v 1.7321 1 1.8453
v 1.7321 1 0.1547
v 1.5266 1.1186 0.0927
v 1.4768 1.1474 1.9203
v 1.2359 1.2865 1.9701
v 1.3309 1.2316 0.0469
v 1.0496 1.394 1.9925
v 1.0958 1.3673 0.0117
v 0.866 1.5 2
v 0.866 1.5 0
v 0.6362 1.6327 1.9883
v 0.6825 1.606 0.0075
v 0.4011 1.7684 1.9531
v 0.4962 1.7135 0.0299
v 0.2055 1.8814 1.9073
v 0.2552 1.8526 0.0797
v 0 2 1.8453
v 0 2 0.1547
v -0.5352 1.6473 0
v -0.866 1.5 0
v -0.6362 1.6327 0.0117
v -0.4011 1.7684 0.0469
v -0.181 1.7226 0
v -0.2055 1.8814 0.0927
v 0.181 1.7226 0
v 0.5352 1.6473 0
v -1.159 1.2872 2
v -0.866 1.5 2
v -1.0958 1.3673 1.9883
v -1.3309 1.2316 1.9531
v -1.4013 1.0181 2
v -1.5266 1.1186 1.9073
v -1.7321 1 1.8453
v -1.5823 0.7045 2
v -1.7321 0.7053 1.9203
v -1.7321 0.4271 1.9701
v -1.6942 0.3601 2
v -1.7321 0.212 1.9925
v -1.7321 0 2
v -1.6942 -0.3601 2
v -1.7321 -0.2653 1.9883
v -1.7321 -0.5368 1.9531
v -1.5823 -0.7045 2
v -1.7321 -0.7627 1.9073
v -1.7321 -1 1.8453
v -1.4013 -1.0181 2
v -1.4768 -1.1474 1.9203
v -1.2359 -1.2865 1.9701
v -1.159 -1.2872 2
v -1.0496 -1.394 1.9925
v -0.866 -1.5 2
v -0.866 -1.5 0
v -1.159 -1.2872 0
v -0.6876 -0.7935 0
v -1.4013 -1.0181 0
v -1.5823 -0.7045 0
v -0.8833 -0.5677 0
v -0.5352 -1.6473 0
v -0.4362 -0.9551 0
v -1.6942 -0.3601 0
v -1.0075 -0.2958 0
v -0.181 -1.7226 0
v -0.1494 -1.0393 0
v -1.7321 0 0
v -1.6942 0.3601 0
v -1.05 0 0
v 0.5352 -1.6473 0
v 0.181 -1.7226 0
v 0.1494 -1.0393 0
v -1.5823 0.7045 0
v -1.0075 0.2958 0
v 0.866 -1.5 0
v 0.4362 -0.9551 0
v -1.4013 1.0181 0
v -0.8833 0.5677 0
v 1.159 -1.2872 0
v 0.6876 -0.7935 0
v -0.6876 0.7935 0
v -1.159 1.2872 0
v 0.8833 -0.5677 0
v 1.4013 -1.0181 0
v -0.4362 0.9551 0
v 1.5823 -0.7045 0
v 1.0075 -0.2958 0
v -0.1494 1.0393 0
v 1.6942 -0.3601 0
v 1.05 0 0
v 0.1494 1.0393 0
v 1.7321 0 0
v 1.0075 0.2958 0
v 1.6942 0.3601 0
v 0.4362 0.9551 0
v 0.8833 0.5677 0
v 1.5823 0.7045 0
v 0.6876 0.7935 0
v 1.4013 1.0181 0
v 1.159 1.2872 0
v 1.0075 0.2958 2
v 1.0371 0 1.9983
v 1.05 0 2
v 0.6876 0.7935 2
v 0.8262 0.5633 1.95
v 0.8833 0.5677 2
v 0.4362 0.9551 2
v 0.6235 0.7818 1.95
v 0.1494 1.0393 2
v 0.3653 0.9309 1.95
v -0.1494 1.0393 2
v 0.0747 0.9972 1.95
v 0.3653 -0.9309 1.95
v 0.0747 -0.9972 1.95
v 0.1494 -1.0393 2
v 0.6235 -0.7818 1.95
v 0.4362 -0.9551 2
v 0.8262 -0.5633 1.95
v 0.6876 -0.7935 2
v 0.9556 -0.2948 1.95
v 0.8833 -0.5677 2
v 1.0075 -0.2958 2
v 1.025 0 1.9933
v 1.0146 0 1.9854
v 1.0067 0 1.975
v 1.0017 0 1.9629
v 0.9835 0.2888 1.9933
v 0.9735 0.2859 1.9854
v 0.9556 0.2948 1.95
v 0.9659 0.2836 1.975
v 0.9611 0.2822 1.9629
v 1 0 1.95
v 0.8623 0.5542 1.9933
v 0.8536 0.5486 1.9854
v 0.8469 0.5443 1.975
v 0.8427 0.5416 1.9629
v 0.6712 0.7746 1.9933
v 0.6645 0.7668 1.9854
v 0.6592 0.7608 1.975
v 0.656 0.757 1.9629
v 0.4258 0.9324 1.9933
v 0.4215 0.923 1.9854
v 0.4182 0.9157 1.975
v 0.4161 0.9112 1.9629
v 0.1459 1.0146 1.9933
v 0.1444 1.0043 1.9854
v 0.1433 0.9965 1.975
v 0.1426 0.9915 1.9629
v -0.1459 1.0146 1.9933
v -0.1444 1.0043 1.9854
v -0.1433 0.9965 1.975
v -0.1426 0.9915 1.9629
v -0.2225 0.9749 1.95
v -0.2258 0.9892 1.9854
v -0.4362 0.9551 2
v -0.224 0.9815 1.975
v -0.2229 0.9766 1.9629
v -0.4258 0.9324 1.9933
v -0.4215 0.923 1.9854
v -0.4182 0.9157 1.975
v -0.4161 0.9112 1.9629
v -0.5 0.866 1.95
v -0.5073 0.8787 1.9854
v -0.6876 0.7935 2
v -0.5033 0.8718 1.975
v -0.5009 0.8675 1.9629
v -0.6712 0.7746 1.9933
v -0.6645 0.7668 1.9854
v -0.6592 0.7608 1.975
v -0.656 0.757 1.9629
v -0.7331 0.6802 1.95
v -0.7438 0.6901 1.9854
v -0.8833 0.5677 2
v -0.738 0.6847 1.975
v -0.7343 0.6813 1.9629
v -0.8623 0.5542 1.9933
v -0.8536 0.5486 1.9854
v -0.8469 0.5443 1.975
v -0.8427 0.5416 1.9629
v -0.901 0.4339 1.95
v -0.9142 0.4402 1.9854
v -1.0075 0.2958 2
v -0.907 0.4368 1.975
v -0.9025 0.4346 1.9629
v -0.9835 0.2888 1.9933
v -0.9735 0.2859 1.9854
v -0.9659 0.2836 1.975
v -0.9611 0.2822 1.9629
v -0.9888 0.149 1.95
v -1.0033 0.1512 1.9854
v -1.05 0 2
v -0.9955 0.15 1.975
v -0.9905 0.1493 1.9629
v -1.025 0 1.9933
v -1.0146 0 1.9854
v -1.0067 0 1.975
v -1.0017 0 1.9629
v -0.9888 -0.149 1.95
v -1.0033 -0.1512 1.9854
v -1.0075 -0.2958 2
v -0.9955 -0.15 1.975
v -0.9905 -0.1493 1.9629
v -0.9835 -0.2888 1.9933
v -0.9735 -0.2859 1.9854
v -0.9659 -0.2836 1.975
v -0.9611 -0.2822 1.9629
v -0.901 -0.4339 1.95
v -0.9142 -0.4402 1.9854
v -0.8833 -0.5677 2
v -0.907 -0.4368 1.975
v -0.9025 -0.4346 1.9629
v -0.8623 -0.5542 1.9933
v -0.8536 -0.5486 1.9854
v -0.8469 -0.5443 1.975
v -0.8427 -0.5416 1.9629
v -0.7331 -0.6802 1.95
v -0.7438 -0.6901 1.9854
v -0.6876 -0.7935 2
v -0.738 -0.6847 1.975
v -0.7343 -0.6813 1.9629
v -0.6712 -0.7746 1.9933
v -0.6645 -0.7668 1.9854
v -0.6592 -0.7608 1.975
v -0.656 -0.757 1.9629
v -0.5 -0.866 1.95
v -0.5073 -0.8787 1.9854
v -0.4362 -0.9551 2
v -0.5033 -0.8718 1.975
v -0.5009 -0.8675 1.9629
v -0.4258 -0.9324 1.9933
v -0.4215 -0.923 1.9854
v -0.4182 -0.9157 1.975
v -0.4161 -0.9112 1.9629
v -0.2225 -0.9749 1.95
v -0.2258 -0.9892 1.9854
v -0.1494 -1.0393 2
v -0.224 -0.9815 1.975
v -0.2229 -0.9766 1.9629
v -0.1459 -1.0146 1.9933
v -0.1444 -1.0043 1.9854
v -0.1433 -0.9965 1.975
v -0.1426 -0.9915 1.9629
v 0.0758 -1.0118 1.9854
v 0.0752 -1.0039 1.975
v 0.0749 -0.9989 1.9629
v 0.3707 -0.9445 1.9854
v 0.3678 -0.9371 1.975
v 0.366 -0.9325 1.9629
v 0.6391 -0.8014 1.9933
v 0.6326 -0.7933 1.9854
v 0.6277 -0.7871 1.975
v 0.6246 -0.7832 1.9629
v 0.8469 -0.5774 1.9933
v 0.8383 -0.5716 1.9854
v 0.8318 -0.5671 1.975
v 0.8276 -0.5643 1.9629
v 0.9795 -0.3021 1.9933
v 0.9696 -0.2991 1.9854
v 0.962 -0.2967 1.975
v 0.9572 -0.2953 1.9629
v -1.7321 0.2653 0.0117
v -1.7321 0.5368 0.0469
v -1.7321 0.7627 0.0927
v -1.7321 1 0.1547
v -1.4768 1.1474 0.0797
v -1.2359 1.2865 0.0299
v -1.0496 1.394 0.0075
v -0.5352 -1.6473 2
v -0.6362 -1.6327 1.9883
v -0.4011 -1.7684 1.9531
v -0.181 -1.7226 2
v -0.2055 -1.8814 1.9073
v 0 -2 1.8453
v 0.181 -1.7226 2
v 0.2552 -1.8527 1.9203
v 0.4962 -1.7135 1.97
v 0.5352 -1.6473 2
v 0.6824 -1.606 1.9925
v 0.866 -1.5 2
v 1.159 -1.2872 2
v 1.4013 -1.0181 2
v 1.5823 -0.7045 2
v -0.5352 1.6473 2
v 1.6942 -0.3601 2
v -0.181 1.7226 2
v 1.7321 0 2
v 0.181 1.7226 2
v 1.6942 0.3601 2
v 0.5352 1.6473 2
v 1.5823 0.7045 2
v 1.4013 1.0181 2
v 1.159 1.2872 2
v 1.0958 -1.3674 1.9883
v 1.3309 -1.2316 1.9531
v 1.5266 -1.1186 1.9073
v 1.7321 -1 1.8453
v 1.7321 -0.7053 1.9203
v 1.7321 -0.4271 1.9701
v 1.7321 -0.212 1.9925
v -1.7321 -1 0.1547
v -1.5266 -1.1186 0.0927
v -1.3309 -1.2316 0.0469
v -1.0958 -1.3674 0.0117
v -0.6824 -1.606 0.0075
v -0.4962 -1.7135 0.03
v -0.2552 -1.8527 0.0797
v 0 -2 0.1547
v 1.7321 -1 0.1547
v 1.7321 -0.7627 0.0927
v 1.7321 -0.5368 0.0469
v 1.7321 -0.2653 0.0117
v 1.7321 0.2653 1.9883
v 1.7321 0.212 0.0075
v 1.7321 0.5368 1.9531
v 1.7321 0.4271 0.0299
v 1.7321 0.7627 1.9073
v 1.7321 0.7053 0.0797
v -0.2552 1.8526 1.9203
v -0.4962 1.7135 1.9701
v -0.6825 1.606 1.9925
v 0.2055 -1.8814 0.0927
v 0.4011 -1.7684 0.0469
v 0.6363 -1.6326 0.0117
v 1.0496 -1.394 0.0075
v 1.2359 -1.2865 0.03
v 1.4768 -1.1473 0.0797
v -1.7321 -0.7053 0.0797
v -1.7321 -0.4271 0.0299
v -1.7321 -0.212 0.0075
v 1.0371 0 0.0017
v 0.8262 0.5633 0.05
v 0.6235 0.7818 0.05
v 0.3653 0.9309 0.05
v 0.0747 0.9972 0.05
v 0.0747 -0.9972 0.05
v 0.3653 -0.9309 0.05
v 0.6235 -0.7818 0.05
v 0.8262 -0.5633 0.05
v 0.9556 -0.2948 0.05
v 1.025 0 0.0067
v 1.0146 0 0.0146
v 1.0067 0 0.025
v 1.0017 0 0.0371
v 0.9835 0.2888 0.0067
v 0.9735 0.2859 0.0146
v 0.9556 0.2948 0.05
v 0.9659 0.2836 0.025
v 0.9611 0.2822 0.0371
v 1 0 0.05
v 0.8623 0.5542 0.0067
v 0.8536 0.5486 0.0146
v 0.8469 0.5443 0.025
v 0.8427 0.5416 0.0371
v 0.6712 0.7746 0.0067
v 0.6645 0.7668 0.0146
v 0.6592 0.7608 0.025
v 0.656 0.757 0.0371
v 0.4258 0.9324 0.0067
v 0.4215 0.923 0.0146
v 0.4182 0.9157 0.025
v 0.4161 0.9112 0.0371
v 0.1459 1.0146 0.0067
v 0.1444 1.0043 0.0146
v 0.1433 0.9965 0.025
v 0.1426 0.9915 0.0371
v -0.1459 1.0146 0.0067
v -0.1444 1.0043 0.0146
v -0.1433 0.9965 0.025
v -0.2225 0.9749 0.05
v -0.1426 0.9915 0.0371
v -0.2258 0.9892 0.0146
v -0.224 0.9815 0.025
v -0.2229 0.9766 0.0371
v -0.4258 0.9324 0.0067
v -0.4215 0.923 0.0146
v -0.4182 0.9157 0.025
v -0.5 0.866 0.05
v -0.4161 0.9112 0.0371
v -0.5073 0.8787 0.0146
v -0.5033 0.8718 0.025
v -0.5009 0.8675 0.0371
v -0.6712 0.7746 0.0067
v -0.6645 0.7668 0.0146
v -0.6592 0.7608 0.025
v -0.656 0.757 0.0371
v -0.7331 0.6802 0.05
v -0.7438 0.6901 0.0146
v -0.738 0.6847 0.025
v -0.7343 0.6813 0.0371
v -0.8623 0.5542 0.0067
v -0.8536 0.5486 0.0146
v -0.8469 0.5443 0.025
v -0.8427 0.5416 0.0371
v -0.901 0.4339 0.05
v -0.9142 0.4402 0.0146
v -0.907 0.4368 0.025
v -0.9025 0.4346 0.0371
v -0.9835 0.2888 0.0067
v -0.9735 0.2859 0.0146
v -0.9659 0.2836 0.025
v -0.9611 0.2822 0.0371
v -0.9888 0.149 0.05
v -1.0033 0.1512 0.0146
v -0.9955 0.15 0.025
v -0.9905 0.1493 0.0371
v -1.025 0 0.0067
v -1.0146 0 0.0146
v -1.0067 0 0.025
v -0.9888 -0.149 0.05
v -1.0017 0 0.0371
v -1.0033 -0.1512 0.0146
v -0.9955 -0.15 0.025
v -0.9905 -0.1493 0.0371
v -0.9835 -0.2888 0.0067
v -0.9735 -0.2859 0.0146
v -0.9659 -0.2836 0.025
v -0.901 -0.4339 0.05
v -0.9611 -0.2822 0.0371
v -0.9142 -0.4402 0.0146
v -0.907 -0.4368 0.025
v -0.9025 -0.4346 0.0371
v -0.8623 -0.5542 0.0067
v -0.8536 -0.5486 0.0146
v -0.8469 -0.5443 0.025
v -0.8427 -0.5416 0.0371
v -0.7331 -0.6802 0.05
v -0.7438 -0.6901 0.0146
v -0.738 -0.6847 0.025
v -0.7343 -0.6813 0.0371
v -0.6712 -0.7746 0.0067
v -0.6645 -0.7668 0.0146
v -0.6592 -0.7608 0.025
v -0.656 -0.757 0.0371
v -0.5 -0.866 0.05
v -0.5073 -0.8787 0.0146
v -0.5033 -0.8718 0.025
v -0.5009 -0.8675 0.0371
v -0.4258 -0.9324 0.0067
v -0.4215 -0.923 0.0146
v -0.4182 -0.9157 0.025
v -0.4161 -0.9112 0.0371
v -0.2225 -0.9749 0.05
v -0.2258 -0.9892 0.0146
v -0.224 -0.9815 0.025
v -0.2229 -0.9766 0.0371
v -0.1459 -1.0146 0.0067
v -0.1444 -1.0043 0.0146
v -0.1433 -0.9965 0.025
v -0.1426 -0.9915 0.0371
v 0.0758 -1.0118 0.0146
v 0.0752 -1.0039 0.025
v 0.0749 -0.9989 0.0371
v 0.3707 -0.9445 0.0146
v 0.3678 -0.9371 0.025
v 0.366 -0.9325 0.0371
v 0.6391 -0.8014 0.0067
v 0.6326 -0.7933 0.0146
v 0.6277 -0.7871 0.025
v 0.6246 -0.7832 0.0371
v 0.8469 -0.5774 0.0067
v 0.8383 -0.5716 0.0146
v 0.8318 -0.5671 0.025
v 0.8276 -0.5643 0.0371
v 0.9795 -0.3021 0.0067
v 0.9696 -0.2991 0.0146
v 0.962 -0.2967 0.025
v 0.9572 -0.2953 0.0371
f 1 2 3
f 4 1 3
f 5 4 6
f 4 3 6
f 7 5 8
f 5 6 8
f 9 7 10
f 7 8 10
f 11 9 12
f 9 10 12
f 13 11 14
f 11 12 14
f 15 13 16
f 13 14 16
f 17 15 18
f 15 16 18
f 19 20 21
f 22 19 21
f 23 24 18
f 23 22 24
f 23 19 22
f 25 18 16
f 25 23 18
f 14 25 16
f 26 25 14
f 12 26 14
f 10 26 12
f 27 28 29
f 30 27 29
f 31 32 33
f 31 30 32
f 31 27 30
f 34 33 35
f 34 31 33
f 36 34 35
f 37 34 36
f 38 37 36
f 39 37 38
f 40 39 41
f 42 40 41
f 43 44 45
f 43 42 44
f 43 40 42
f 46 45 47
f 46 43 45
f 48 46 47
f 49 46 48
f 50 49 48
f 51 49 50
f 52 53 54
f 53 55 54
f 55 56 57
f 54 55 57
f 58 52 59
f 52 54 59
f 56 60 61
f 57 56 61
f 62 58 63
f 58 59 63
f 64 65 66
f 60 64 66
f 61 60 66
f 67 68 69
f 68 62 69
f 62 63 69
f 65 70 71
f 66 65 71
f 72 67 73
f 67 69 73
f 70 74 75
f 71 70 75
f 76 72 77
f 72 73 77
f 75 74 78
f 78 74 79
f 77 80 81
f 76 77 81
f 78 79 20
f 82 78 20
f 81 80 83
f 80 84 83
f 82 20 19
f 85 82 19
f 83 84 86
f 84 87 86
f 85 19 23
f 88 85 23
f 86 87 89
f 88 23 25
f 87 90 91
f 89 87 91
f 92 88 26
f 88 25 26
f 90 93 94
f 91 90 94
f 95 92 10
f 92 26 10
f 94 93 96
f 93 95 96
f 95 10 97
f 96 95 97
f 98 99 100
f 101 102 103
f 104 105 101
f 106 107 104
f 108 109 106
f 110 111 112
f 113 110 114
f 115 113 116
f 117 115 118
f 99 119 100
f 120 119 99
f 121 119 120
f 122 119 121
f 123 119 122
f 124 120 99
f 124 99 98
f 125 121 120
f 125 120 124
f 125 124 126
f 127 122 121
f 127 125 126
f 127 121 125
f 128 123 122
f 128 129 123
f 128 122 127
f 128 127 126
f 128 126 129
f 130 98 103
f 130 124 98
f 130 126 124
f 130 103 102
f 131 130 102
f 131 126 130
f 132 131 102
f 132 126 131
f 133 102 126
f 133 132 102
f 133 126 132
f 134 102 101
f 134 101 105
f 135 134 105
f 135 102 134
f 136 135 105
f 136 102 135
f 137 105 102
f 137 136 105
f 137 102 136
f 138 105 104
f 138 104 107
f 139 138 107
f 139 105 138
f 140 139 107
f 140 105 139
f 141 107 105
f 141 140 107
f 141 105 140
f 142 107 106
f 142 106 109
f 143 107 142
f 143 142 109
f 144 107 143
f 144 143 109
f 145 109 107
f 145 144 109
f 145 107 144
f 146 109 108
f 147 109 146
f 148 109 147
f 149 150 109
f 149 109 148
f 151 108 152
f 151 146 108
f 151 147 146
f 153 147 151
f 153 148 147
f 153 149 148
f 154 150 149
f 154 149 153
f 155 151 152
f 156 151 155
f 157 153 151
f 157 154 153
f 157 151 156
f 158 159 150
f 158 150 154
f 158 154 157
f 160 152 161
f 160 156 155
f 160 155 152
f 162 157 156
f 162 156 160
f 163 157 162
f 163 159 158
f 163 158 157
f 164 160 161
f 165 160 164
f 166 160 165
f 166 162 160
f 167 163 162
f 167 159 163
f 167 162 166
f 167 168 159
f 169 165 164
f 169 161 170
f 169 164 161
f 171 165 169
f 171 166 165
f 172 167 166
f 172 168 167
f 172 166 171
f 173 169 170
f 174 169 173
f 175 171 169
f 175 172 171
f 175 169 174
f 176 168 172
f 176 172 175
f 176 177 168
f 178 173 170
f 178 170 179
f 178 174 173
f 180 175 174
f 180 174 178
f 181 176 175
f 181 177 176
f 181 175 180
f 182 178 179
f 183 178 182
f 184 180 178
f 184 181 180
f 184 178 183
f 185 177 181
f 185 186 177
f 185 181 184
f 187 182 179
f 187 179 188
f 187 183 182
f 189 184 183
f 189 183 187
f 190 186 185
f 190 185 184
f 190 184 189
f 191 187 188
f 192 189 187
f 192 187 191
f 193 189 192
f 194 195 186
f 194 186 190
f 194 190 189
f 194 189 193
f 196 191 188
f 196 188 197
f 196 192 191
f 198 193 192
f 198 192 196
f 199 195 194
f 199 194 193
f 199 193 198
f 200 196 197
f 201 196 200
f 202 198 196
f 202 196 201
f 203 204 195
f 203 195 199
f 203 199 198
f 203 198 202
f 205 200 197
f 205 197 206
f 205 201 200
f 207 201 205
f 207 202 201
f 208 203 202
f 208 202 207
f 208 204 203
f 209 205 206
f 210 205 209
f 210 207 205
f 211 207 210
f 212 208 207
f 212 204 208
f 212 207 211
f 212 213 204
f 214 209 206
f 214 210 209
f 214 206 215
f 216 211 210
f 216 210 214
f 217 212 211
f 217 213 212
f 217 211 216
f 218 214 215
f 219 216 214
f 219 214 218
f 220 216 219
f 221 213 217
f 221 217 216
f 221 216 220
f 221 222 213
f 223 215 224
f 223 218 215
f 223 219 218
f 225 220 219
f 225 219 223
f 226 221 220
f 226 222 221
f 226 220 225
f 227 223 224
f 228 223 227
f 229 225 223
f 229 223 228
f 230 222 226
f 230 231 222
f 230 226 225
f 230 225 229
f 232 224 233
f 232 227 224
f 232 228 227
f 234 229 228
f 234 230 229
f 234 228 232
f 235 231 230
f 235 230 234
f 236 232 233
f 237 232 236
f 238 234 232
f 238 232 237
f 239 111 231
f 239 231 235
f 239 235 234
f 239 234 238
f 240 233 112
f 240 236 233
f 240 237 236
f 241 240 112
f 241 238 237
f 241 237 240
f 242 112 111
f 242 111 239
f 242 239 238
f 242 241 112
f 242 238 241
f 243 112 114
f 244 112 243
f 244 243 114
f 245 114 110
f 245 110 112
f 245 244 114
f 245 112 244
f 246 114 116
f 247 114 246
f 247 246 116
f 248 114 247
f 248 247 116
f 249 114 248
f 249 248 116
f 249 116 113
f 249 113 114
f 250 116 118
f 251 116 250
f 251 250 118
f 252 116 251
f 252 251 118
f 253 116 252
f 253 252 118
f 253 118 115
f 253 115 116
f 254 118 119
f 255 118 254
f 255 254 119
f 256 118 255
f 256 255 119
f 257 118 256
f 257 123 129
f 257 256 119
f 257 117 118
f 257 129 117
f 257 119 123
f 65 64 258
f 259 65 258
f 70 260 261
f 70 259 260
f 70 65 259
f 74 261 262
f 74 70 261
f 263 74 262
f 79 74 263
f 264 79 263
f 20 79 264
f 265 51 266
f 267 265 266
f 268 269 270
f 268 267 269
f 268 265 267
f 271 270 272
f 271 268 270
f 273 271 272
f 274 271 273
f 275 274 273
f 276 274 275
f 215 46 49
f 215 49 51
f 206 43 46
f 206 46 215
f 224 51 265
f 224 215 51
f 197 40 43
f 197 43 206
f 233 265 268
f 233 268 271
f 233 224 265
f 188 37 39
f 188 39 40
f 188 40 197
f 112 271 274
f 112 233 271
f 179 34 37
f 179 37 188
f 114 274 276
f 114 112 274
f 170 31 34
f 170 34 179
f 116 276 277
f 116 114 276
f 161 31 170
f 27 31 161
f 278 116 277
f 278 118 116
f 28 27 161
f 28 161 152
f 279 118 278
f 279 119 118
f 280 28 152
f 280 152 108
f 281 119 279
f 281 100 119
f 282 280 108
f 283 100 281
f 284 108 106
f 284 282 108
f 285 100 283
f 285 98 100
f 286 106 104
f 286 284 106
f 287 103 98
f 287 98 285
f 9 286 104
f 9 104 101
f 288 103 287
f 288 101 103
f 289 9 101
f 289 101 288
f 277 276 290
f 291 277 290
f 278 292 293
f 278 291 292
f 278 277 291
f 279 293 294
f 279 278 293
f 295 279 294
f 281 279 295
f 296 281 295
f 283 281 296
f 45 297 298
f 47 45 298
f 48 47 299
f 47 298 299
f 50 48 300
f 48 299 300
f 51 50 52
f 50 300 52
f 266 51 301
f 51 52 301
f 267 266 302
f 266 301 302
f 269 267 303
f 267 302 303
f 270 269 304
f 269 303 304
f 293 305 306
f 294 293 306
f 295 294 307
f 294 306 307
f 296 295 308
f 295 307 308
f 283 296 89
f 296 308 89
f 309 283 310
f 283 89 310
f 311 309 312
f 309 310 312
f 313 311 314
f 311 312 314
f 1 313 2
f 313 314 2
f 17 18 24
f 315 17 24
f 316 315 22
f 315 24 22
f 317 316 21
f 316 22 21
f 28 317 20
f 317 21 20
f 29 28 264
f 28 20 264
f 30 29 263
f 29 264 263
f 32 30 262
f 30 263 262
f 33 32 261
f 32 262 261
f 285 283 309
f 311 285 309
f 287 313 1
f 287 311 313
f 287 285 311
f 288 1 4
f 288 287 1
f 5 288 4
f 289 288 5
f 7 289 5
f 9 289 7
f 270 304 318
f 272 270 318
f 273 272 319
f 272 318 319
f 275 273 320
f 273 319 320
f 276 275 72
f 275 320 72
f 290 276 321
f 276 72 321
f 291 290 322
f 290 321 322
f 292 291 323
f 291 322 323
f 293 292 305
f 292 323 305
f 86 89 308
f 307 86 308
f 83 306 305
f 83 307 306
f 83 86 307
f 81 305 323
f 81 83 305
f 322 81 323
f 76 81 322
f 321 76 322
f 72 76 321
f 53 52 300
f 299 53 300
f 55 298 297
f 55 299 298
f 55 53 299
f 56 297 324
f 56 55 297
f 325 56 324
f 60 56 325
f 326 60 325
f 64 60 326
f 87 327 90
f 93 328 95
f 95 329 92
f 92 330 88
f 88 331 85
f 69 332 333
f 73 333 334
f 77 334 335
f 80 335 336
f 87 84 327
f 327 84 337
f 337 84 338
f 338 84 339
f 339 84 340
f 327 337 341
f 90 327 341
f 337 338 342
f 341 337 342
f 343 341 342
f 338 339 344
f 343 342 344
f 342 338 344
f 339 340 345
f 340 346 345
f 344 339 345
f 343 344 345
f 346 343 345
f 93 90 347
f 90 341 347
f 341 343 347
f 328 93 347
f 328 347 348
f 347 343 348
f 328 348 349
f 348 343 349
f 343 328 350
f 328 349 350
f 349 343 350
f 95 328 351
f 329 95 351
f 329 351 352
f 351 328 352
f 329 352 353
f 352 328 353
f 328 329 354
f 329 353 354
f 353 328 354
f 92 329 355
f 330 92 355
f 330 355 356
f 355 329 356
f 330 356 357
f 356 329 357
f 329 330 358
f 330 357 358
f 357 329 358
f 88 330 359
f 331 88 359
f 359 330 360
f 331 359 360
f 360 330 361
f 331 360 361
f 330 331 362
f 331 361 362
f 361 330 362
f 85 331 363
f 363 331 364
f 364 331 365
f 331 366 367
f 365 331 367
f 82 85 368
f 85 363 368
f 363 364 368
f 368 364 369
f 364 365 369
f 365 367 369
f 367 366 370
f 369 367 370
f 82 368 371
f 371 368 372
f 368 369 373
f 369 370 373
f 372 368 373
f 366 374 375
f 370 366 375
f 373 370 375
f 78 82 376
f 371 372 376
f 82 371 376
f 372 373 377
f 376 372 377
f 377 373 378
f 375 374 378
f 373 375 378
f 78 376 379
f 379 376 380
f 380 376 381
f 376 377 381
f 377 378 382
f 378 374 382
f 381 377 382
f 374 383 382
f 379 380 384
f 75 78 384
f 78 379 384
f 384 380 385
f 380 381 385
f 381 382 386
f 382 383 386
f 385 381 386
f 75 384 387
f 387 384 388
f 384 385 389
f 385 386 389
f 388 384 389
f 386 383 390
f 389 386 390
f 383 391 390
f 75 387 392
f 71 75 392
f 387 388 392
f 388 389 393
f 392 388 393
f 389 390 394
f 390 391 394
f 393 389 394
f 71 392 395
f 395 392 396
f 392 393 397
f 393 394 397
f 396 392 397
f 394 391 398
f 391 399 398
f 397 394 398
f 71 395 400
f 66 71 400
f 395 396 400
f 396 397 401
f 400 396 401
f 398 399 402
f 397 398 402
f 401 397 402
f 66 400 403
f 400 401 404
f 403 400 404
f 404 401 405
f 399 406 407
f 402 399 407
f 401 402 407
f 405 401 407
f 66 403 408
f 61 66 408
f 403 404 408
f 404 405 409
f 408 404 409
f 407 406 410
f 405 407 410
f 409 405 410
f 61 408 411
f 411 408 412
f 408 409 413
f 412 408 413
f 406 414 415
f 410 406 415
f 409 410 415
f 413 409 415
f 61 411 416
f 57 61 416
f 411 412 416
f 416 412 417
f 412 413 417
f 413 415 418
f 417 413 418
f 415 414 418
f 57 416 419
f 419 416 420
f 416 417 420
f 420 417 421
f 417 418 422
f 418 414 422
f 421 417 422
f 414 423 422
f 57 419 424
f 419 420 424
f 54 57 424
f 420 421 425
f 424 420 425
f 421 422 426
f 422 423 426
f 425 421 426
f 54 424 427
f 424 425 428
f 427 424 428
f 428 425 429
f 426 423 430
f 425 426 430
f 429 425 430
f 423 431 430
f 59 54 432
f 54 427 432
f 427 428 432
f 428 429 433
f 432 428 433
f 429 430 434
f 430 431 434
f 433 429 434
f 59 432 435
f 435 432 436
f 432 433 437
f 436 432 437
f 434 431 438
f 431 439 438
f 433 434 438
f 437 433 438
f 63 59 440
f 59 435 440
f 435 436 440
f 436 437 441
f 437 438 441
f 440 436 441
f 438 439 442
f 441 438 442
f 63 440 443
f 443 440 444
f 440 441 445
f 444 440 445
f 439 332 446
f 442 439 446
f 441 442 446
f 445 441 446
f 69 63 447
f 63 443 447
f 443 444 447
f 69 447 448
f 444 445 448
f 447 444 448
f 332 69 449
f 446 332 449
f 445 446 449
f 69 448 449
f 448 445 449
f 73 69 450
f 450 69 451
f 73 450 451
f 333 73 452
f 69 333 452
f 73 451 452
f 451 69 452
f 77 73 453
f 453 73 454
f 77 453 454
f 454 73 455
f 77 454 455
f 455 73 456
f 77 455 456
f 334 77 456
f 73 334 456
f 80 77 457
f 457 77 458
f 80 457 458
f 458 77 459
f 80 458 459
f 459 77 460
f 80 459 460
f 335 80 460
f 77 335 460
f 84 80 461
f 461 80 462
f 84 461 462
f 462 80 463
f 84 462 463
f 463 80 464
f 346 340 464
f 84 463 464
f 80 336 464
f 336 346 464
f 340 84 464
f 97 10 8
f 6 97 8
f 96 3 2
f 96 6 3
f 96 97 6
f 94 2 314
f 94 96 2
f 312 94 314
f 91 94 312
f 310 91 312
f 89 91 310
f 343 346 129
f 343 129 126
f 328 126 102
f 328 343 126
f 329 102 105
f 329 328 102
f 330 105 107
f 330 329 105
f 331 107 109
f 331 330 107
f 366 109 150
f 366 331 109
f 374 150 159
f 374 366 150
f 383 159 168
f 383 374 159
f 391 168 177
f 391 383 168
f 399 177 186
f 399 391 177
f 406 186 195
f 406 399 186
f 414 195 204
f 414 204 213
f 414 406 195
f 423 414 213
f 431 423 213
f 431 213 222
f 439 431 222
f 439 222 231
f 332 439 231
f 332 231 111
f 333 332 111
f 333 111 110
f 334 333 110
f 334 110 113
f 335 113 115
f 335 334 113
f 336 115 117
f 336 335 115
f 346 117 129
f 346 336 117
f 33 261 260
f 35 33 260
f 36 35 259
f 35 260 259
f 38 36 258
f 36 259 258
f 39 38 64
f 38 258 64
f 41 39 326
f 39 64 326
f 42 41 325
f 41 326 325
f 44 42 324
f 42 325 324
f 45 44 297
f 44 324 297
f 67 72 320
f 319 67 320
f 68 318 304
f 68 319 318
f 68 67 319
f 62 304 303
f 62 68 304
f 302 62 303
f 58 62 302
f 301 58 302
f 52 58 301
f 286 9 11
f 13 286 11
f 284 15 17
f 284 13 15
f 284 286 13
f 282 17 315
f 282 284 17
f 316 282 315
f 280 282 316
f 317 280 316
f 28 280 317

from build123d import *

# Parameters (mm, degrees)
SKETCH1_R           = 1
BOSS_EXTRUDE1_DEPTH = 2
SKETCH7_OUTSIDE_W   = 13.524
SKETCH7_OUTSIDE_H   = 14.06
SKETCH7_OUTSIDE_R   = 1.732050808
CUT_EXTRUDE1_DEPTH  = 2
CUT_EXTRUDE1_DRAFT  = -60
SKETCH9_OUTSIDE_W   = 13.524
SKETCH9_OUTSIDE_H   = 14.06
SKETCH9_OUTSIDE_R   = 1.732050808
CUT_EXTRUDE2_DEPTH  = 2
CUT_EXTRUDE2_DRAFT  = -60
FILLET1_R           = 0.05


with BuildPart() as part:
    # Sketch1 → Boss-Extrude1 (new body)
    with BuildSketch(Plane.XY):
        Polygon((0, 2), (-1.732050808, 1), (-1.732050808, -1), (0, -2), (1.732050808, -1), (1.732050808, 1), align=None)
        Circle(SKETCH1_R, mode=Mode.SUBTRACT)
    extrude(amount=BOSS_EXTRUDE1_DEPTH)


with BuildPart() as cut_extrude1_tool:
    # Sketch7 outside → Cut-Extrude1 (with draft: the straight prism first)
    with BuildSketch(Plane.XY.offset(2)):
        Rectangle(SKETCH7_OUTSIDE_W, SKETCH7_OUTSIDE_H)
        Circle(SKETCH7_OUTSIDE_R, mode=Mode.SUBTRACT)
    extrude(amount=-CUT_EXTRUDE1_DEPTH)
    # Cut-Extrude1: the draft: its side faces are tilted about the plane it starts from
    cut_extrude1_sides = [cut_extrude1_tool.faces().sort_by_distance(p)[0] for p in [
        (0, -7.03, 1),
        (6.762, 0, 1),
        (0, 7.03, 1),
        (-6.762, 0, 1),
        (-1.732050808, 0, 1),
    ]]
    draft(cut_extrude1_sides, Plane.XY.offset(2), CUT_EXTRUDE1_DRAFT)


with BuildPart() as part_1:
    add(part.part)

    # Cut-Extrude1: cut by cut_extrude1_tool
    add(cut_extrude1_tool.part, mode=Mode.SUBTRACT)


with BuildPart() as cut_extrude2_tool:
    # Sketch9 outside → Cut-Extrude2 (with draft: the straight prism first)
    with BuildSketch(Plane(origin=(0, 0, 0), x_dir=(-1, 0, 0), z_dir=(0, 0, -1))):
        Rectangle(SKETCH9_OUTSIDE_W, SKETCH9_OUTSIDE_H)
        Circle(SKETCH9_OUTSIDE_R, mode=Mode.SUBTRACT)
    extrude(amount=-CUT_EXTRUDE2_DEPTH)
    # Cut-Extrude2: the draft: its side faces are tilted about the plane it starts from
    cut_extrude2_sides = [cut_extrude2_tool.faces().sort_by_distance(p)[0] for p in [
        (0, -7.03, 1),
        (-6.762, 0, 1),
        (0, 7.03, 1),
        (6.762, 0, 1),
        (1.732050808, 0, 1),
    ]]
    draft(cut_extrude2_sides, Plane(origin=(0, 0, 0), x_dir=(-1, 0, 0), z_dir=(0, 0, -1)), CUT_EXTRUDE2_DRAFT)


with BuildPart() as part_2:
    add(part_1.part)

    # Cut-Extrude2: cut by cut_extrude2_tool
    add(cut_extrude2_tool.part, mode=Mode.SUBTRACT)

    # Fillet1
    fillet1_edges = [part_2.edges().sort_by_distance(p)[0] for p in [
        (-1, 0, 0),
        (-1, 0, 2),
    ]]
    fillet(fillet1_edges, radius=FILLET1_R)


solid = part_2.part
